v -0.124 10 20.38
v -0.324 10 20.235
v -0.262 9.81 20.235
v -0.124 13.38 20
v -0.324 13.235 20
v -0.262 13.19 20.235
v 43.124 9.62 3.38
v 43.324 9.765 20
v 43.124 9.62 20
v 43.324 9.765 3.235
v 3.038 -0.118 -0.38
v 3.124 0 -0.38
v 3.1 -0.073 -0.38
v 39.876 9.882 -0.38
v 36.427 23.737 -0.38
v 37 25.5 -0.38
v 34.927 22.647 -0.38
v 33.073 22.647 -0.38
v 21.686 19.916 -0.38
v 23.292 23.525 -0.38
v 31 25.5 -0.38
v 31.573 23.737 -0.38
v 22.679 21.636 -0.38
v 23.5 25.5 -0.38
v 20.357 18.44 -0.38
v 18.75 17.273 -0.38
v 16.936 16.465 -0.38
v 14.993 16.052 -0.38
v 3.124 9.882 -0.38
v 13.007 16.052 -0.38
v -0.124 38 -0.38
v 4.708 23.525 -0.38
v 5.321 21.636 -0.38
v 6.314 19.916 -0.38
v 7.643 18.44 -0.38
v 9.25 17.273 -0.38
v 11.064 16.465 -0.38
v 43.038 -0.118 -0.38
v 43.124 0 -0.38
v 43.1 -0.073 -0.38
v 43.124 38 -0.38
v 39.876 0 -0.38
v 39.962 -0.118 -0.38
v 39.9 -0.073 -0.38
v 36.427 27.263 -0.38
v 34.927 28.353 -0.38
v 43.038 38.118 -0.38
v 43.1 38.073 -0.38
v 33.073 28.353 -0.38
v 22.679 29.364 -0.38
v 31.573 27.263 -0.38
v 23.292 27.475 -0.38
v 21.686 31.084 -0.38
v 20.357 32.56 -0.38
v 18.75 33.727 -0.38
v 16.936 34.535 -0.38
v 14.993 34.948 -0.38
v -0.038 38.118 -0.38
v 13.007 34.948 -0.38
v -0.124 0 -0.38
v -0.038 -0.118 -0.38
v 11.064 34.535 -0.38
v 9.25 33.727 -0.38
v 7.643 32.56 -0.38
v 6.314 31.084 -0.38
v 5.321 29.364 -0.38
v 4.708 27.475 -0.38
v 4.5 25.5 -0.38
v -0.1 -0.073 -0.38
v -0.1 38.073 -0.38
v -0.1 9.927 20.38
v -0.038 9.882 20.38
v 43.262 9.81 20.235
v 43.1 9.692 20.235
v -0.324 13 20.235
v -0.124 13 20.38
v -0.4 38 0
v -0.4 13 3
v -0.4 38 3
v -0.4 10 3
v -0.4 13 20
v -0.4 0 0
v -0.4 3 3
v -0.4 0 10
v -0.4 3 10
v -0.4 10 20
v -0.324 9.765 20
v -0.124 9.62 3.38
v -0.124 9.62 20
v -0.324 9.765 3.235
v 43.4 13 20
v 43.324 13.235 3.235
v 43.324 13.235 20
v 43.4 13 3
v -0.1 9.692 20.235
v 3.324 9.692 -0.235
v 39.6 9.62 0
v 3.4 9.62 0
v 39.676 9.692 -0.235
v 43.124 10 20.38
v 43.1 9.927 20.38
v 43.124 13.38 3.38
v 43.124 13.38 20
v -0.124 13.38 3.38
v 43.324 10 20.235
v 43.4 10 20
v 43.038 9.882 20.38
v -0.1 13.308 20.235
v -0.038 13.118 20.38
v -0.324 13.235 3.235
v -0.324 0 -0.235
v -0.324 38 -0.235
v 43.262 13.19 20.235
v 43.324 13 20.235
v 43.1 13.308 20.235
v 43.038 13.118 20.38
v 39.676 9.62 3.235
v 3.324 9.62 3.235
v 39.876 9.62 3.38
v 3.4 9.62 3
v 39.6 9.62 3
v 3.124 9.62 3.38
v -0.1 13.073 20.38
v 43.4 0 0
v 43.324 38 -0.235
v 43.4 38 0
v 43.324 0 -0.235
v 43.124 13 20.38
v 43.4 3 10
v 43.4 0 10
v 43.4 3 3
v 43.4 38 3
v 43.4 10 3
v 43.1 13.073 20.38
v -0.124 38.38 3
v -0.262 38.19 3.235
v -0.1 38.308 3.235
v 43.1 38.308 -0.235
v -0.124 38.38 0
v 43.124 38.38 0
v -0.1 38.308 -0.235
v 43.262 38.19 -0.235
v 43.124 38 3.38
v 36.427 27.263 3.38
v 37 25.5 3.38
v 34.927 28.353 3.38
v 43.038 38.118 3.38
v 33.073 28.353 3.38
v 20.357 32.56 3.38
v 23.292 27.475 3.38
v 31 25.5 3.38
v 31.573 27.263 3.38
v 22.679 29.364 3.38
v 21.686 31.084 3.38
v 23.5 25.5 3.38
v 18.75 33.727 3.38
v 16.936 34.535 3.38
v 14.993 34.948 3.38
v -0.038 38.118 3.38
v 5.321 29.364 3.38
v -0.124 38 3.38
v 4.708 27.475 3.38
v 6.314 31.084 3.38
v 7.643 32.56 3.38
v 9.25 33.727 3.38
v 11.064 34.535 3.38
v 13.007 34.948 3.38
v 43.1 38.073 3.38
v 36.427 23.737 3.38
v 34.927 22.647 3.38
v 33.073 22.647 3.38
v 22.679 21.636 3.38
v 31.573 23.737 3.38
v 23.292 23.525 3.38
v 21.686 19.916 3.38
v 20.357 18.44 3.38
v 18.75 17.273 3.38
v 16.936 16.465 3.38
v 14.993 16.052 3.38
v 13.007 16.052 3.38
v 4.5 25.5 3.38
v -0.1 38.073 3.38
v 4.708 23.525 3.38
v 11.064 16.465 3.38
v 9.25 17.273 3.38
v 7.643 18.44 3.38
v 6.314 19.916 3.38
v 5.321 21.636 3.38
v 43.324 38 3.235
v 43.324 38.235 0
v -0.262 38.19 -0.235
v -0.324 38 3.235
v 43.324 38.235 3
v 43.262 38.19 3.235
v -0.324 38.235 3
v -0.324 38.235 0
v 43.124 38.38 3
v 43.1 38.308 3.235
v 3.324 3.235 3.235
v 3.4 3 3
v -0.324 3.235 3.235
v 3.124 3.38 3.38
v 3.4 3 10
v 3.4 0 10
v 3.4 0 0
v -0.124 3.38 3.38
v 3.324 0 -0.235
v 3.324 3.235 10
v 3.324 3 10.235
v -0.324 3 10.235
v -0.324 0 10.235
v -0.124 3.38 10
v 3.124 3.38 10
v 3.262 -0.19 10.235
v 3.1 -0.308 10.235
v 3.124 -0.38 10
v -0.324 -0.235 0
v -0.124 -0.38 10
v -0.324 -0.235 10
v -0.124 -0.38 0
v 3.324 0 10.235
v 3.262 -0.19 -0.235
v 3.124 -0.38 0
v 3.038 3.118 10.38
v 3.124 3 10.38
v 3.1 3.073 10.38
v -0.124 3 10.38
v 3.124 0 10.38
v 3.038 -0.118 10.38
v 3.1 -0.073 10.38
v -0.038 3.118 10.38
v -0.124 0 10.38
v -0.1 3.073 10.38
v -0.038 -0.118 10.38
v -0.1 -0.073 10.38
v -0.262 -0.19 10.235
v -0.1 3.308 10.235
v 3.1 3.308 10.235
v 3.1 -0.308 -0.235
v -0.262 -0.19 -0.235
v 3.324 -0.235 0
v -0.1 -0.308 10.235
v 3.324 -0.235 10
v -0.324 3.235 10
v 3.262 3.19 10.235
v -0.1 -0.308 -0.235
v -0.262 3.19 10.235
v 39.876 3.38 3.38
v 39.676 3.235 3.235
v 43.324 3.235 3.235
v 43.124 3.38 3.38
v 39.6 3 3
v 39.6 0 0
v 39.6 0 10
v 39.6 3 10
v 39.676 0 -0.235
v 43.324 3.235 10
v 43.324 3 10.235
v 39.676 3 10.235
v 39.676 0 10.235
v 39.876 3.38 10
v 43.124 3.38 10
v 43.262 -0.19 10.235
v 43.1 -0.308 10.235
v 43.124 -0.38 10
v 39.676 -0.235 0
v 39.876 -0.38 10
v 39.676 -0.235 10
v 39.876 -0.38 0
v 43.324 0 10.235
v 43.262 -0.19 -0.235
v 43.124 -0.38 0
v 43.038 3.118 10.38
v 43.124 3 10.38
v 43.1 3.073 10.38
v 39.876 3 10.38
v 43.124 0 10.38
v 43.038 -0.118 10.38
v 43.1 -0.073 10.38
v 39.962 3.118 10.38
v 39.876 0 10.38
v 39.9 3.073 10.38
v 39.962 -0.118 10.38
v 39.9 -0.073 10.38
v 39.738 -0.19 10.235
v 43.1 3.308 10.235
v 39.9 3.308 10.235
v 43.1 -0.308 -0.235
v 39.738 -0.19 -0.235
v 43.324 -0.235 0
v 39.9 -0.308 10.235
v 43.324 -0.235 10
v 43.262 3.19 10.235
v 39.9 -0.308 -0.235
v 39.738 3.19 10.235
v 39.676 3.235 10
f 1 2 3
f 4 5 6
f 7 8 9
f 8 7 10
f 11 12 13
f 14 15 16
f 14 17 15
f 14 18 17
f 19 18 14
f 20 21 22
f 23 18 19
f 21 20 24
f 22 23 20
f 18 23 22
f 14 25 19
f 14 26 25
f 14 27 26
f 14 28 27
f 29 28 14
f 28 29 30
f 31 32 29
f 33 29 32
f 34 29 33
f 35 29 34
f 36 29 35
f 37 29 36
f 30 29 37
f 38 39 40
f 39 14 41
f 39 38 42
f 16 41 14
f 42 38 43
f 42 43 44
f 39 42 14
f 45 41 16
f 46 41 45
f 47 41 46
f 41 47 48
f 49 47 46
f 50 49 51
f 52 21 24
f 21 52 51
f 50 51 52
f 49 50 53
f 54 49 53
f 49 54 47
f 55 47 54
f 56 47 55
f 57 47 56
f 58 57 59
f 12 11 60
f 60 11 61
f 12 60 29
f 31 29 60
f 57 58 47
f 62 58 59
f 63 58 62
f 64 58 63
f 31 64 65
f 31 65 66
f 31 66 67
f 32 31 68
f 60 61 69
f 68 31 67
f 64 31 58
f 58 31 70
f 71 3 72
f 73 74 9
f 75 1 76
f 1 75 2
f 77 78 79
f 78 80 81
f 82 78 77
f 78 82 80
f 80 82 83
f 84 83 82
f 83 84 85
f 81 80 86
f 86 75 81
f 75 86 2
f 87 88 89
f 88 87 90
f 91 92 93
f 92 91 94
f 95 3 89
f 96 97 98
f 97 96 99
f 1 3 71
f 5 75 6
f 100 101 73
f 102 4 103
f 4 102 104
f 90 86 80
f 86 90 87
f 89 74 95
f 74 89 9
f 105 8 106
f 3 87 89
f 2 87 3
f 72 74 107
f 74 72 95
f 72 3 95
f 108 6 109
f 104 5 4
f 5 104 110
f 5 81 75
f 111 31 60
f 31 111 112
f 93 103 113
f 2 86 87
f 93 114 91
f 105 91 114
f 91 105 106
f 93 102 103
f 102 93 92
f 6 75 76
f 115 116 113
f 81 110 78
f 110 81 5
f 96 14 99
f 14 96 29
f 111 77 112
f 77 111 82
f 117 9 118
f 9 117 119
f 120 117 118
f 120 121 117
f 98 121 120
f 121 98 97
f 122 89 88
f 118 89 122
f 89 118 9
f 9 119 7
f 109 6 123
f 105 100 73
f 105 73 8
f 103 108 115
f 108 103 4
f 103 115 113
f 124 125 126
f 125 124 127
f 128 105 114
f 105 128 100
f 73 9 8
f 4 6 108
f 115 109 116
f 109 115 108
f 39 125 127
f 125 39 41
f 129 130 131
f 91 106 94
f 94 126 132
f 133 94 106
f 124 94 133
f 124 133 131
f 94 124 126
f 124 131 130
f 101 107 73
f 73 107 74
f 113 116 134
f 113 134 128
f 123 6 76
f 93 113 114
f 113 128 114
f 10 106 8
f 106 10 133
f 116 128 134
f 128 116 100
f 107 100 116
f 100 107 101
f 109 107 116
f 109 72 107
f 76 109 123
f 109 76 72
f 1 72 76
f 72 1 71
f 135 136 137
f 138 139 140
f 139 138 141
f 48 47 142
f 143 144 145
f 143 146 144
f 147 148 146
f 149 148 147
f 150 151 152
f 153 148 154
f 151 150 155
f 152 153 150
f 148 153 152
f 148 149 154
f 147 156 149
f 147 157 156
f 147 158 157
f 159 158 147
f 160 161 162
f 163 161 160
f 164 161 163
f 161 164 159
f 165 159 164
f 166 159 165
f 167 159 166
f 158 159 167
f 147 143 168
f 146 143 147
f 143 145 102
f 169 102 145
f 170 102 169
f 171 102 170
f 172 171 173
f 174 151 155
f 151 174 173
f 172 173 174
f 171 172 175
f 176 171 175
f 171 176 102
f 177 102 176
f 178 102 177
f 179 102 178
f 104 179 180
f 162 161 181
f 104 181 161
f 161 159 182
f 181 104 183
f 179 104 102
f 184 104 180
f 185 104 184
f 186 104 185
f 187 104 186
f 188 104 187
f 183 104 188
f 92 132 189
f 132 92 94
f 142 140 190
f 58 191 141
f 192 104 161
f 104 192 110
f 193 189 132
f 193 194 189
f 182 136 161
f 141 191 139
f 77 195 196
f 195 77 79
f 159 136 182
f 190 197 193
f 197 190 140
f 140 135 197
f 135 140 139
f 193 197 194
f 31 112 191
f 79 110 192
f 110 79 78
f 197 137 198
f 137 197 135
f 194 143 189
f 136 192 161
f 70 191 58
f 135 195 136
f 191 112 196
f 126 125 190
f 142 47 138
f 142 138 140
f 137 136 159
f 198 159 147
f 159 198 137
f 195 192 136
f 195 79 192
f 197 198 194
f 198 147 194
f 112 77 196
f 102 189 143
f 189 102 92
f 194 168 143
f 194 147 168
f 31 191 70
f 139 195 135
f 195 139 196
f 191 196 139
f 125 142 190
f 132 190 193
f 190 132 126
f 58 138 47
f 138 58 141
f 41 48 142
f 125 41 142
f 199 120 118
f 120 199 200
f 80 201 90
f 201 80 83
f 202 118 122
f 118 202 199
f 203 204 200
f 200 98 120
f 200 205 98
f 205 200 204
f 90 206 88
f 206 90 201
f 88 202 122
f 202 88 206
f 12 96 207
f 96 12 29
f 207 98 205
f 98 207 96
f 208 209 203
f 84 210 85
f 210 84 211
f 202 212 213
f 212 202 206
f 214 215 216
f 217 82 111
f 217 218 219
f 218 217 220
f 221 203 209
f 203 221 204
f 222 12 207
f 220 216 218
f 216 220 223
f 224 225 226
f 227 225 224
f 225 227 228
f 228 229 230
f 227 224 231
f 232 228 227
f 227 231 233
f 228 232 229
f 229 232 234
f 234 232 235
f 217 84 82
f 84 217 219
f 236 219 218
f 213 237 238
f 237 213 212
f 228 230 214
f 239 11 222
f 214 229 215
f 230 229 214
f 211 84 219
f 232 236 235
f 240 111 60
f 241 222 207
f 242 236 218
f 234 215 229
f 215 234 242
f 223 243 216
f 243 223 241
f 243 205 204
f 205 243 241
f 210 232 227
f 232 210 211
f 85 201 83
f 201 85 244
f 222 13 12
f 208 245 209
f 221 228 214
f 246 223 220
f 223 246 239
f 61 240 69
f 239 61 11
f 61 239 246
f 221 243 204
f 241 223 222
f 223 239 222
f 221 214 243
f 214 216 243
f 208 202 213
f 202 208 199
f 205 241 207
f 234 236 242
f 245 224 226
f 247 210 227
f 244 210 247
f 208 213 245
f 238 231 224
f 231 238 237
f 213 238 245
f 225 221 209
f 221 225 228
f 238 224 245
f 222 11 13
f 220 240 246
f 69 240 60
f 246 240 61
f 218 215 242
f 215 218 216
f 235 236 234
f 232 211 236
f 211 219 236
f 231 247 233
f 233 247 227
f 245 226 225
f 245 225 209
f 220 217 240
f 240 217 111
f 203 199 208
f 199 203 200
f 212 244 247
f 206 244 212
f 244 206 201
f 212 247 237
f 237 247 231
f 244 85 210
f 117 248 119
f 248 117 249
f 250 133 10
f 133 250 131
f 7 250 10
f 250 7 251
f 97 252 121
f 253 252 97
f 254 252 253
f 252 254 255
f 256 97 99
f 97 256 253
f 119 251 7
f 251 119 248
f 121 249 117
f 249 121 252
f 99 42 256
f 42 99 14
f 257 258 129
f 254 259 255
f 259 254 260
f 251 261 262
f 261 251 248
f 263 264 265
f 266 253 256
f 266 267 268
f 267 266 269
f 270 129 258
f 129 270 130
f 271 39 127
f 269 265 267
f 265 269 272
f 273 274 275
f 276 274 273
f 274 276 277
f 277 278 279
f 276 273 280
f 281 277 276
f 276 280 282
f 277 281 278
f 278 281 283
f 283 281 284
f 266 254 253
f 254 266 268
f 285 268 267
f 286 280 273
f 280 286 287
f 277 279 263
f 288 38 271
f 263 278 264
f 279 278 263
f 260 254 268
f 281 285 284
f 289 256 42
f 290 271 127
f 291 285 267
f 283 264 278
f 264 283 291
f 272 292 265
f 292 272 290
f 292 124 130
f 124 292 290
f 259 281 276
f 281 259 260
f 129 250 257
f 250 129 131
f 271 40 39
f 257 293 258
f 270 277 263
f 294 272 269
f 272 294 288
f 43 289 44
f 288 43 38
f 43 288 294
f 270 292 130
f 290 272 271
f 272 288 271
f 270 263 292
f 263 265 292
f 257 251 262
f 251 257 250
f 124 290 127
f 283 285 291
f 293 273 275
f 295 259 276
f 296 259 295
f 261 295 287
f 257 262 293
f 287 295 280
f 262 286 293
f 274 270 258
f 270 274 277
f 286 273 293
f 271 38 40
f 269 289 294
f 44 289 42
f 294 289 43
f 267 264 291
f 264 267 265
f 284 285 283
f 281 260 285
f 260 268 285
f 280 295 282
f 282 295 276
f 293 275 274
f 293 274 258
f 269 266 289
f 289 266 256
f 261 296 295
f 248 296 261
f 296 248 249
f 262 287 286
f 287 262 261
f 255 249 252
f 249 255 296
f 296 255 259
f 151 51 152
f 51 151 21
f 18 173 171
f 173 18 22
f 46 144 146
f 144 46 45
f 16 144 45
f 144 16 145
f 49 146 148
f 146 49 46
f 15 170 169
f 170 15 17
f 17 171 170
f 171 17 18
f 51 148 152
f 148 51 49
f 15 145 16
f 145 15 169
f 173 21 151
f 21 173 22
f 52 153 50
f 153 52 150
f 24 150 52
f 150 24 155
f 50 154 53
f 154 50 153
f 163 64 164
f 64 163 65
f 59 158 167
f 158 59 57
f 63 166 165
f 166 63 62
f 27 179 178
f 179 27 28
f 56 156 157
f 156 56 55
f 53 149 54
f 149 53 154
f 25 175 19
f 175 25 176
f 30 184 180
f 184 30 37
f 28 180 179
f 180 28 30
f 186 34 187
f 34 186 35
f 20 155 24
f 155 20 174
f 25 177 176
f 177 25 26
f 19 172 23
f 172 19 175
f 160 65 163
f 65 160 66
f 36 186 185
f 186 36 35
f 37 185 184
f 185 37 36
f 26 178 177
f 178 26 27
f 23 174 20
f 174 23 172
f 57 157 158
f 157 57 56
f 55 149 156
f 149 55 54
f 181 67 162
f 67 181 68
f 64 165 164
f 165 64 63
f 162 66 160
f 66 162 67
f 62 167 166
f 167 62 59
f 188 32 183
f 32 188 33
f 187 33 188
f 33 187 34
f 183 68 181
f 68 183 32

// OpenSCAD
function sum(v, i = 0, r = 0) = i < len(v) ? sum(v, i + 1, r + v[i]) : r;

// The number of rows the holder should span
rows = 1;
// An array of hole diameters
holes = [5, 18];
// An array with spaces corresponding to each hole
widths = [15, 25];
// A tolerance subtracted from the holder dimensions
tolerance = 0.1;

module hooks(rows = 1, holes, uppers) {
  width = 40*(rows) + 3;
  depth = max(uppers);
  difference() {
    minkowski() {
      sphere(r=0.5 - tolerance, $fn=10);
      union() {
        for (i = [0:40:(40*rows)]) {
          translate([i, 0, 0]) {
            cube([3, 10, 3]);
            cube([3, 3, 10]);
          }
        }
        translate([0, 10, 0])
          cube([width, 3, 20]);
        translate([0, 13, 0])
          cube([width, depth, 3]);
      }
    }
    translate([0, 13, -1]) {
      offset = (width - sum(uppers)) / 2;
      uppers_with_dummy = concat([0], uppers);
      hole_offsets = 
        [for (i = [1:len(uppers_with_dummy) - 1]) 
          sum(uppers_with_dummy, i) - uppers_with_dummy[i]/2];
      for (i = [0:len(hole_offsets) - 1]) {
        translate([hole_offsets[i] + offset, depth/2, -1])
          cylinder(d=holes[i] + 1, h=8);
      }
    }
  }
}

hooks(rows, holes, widths);
